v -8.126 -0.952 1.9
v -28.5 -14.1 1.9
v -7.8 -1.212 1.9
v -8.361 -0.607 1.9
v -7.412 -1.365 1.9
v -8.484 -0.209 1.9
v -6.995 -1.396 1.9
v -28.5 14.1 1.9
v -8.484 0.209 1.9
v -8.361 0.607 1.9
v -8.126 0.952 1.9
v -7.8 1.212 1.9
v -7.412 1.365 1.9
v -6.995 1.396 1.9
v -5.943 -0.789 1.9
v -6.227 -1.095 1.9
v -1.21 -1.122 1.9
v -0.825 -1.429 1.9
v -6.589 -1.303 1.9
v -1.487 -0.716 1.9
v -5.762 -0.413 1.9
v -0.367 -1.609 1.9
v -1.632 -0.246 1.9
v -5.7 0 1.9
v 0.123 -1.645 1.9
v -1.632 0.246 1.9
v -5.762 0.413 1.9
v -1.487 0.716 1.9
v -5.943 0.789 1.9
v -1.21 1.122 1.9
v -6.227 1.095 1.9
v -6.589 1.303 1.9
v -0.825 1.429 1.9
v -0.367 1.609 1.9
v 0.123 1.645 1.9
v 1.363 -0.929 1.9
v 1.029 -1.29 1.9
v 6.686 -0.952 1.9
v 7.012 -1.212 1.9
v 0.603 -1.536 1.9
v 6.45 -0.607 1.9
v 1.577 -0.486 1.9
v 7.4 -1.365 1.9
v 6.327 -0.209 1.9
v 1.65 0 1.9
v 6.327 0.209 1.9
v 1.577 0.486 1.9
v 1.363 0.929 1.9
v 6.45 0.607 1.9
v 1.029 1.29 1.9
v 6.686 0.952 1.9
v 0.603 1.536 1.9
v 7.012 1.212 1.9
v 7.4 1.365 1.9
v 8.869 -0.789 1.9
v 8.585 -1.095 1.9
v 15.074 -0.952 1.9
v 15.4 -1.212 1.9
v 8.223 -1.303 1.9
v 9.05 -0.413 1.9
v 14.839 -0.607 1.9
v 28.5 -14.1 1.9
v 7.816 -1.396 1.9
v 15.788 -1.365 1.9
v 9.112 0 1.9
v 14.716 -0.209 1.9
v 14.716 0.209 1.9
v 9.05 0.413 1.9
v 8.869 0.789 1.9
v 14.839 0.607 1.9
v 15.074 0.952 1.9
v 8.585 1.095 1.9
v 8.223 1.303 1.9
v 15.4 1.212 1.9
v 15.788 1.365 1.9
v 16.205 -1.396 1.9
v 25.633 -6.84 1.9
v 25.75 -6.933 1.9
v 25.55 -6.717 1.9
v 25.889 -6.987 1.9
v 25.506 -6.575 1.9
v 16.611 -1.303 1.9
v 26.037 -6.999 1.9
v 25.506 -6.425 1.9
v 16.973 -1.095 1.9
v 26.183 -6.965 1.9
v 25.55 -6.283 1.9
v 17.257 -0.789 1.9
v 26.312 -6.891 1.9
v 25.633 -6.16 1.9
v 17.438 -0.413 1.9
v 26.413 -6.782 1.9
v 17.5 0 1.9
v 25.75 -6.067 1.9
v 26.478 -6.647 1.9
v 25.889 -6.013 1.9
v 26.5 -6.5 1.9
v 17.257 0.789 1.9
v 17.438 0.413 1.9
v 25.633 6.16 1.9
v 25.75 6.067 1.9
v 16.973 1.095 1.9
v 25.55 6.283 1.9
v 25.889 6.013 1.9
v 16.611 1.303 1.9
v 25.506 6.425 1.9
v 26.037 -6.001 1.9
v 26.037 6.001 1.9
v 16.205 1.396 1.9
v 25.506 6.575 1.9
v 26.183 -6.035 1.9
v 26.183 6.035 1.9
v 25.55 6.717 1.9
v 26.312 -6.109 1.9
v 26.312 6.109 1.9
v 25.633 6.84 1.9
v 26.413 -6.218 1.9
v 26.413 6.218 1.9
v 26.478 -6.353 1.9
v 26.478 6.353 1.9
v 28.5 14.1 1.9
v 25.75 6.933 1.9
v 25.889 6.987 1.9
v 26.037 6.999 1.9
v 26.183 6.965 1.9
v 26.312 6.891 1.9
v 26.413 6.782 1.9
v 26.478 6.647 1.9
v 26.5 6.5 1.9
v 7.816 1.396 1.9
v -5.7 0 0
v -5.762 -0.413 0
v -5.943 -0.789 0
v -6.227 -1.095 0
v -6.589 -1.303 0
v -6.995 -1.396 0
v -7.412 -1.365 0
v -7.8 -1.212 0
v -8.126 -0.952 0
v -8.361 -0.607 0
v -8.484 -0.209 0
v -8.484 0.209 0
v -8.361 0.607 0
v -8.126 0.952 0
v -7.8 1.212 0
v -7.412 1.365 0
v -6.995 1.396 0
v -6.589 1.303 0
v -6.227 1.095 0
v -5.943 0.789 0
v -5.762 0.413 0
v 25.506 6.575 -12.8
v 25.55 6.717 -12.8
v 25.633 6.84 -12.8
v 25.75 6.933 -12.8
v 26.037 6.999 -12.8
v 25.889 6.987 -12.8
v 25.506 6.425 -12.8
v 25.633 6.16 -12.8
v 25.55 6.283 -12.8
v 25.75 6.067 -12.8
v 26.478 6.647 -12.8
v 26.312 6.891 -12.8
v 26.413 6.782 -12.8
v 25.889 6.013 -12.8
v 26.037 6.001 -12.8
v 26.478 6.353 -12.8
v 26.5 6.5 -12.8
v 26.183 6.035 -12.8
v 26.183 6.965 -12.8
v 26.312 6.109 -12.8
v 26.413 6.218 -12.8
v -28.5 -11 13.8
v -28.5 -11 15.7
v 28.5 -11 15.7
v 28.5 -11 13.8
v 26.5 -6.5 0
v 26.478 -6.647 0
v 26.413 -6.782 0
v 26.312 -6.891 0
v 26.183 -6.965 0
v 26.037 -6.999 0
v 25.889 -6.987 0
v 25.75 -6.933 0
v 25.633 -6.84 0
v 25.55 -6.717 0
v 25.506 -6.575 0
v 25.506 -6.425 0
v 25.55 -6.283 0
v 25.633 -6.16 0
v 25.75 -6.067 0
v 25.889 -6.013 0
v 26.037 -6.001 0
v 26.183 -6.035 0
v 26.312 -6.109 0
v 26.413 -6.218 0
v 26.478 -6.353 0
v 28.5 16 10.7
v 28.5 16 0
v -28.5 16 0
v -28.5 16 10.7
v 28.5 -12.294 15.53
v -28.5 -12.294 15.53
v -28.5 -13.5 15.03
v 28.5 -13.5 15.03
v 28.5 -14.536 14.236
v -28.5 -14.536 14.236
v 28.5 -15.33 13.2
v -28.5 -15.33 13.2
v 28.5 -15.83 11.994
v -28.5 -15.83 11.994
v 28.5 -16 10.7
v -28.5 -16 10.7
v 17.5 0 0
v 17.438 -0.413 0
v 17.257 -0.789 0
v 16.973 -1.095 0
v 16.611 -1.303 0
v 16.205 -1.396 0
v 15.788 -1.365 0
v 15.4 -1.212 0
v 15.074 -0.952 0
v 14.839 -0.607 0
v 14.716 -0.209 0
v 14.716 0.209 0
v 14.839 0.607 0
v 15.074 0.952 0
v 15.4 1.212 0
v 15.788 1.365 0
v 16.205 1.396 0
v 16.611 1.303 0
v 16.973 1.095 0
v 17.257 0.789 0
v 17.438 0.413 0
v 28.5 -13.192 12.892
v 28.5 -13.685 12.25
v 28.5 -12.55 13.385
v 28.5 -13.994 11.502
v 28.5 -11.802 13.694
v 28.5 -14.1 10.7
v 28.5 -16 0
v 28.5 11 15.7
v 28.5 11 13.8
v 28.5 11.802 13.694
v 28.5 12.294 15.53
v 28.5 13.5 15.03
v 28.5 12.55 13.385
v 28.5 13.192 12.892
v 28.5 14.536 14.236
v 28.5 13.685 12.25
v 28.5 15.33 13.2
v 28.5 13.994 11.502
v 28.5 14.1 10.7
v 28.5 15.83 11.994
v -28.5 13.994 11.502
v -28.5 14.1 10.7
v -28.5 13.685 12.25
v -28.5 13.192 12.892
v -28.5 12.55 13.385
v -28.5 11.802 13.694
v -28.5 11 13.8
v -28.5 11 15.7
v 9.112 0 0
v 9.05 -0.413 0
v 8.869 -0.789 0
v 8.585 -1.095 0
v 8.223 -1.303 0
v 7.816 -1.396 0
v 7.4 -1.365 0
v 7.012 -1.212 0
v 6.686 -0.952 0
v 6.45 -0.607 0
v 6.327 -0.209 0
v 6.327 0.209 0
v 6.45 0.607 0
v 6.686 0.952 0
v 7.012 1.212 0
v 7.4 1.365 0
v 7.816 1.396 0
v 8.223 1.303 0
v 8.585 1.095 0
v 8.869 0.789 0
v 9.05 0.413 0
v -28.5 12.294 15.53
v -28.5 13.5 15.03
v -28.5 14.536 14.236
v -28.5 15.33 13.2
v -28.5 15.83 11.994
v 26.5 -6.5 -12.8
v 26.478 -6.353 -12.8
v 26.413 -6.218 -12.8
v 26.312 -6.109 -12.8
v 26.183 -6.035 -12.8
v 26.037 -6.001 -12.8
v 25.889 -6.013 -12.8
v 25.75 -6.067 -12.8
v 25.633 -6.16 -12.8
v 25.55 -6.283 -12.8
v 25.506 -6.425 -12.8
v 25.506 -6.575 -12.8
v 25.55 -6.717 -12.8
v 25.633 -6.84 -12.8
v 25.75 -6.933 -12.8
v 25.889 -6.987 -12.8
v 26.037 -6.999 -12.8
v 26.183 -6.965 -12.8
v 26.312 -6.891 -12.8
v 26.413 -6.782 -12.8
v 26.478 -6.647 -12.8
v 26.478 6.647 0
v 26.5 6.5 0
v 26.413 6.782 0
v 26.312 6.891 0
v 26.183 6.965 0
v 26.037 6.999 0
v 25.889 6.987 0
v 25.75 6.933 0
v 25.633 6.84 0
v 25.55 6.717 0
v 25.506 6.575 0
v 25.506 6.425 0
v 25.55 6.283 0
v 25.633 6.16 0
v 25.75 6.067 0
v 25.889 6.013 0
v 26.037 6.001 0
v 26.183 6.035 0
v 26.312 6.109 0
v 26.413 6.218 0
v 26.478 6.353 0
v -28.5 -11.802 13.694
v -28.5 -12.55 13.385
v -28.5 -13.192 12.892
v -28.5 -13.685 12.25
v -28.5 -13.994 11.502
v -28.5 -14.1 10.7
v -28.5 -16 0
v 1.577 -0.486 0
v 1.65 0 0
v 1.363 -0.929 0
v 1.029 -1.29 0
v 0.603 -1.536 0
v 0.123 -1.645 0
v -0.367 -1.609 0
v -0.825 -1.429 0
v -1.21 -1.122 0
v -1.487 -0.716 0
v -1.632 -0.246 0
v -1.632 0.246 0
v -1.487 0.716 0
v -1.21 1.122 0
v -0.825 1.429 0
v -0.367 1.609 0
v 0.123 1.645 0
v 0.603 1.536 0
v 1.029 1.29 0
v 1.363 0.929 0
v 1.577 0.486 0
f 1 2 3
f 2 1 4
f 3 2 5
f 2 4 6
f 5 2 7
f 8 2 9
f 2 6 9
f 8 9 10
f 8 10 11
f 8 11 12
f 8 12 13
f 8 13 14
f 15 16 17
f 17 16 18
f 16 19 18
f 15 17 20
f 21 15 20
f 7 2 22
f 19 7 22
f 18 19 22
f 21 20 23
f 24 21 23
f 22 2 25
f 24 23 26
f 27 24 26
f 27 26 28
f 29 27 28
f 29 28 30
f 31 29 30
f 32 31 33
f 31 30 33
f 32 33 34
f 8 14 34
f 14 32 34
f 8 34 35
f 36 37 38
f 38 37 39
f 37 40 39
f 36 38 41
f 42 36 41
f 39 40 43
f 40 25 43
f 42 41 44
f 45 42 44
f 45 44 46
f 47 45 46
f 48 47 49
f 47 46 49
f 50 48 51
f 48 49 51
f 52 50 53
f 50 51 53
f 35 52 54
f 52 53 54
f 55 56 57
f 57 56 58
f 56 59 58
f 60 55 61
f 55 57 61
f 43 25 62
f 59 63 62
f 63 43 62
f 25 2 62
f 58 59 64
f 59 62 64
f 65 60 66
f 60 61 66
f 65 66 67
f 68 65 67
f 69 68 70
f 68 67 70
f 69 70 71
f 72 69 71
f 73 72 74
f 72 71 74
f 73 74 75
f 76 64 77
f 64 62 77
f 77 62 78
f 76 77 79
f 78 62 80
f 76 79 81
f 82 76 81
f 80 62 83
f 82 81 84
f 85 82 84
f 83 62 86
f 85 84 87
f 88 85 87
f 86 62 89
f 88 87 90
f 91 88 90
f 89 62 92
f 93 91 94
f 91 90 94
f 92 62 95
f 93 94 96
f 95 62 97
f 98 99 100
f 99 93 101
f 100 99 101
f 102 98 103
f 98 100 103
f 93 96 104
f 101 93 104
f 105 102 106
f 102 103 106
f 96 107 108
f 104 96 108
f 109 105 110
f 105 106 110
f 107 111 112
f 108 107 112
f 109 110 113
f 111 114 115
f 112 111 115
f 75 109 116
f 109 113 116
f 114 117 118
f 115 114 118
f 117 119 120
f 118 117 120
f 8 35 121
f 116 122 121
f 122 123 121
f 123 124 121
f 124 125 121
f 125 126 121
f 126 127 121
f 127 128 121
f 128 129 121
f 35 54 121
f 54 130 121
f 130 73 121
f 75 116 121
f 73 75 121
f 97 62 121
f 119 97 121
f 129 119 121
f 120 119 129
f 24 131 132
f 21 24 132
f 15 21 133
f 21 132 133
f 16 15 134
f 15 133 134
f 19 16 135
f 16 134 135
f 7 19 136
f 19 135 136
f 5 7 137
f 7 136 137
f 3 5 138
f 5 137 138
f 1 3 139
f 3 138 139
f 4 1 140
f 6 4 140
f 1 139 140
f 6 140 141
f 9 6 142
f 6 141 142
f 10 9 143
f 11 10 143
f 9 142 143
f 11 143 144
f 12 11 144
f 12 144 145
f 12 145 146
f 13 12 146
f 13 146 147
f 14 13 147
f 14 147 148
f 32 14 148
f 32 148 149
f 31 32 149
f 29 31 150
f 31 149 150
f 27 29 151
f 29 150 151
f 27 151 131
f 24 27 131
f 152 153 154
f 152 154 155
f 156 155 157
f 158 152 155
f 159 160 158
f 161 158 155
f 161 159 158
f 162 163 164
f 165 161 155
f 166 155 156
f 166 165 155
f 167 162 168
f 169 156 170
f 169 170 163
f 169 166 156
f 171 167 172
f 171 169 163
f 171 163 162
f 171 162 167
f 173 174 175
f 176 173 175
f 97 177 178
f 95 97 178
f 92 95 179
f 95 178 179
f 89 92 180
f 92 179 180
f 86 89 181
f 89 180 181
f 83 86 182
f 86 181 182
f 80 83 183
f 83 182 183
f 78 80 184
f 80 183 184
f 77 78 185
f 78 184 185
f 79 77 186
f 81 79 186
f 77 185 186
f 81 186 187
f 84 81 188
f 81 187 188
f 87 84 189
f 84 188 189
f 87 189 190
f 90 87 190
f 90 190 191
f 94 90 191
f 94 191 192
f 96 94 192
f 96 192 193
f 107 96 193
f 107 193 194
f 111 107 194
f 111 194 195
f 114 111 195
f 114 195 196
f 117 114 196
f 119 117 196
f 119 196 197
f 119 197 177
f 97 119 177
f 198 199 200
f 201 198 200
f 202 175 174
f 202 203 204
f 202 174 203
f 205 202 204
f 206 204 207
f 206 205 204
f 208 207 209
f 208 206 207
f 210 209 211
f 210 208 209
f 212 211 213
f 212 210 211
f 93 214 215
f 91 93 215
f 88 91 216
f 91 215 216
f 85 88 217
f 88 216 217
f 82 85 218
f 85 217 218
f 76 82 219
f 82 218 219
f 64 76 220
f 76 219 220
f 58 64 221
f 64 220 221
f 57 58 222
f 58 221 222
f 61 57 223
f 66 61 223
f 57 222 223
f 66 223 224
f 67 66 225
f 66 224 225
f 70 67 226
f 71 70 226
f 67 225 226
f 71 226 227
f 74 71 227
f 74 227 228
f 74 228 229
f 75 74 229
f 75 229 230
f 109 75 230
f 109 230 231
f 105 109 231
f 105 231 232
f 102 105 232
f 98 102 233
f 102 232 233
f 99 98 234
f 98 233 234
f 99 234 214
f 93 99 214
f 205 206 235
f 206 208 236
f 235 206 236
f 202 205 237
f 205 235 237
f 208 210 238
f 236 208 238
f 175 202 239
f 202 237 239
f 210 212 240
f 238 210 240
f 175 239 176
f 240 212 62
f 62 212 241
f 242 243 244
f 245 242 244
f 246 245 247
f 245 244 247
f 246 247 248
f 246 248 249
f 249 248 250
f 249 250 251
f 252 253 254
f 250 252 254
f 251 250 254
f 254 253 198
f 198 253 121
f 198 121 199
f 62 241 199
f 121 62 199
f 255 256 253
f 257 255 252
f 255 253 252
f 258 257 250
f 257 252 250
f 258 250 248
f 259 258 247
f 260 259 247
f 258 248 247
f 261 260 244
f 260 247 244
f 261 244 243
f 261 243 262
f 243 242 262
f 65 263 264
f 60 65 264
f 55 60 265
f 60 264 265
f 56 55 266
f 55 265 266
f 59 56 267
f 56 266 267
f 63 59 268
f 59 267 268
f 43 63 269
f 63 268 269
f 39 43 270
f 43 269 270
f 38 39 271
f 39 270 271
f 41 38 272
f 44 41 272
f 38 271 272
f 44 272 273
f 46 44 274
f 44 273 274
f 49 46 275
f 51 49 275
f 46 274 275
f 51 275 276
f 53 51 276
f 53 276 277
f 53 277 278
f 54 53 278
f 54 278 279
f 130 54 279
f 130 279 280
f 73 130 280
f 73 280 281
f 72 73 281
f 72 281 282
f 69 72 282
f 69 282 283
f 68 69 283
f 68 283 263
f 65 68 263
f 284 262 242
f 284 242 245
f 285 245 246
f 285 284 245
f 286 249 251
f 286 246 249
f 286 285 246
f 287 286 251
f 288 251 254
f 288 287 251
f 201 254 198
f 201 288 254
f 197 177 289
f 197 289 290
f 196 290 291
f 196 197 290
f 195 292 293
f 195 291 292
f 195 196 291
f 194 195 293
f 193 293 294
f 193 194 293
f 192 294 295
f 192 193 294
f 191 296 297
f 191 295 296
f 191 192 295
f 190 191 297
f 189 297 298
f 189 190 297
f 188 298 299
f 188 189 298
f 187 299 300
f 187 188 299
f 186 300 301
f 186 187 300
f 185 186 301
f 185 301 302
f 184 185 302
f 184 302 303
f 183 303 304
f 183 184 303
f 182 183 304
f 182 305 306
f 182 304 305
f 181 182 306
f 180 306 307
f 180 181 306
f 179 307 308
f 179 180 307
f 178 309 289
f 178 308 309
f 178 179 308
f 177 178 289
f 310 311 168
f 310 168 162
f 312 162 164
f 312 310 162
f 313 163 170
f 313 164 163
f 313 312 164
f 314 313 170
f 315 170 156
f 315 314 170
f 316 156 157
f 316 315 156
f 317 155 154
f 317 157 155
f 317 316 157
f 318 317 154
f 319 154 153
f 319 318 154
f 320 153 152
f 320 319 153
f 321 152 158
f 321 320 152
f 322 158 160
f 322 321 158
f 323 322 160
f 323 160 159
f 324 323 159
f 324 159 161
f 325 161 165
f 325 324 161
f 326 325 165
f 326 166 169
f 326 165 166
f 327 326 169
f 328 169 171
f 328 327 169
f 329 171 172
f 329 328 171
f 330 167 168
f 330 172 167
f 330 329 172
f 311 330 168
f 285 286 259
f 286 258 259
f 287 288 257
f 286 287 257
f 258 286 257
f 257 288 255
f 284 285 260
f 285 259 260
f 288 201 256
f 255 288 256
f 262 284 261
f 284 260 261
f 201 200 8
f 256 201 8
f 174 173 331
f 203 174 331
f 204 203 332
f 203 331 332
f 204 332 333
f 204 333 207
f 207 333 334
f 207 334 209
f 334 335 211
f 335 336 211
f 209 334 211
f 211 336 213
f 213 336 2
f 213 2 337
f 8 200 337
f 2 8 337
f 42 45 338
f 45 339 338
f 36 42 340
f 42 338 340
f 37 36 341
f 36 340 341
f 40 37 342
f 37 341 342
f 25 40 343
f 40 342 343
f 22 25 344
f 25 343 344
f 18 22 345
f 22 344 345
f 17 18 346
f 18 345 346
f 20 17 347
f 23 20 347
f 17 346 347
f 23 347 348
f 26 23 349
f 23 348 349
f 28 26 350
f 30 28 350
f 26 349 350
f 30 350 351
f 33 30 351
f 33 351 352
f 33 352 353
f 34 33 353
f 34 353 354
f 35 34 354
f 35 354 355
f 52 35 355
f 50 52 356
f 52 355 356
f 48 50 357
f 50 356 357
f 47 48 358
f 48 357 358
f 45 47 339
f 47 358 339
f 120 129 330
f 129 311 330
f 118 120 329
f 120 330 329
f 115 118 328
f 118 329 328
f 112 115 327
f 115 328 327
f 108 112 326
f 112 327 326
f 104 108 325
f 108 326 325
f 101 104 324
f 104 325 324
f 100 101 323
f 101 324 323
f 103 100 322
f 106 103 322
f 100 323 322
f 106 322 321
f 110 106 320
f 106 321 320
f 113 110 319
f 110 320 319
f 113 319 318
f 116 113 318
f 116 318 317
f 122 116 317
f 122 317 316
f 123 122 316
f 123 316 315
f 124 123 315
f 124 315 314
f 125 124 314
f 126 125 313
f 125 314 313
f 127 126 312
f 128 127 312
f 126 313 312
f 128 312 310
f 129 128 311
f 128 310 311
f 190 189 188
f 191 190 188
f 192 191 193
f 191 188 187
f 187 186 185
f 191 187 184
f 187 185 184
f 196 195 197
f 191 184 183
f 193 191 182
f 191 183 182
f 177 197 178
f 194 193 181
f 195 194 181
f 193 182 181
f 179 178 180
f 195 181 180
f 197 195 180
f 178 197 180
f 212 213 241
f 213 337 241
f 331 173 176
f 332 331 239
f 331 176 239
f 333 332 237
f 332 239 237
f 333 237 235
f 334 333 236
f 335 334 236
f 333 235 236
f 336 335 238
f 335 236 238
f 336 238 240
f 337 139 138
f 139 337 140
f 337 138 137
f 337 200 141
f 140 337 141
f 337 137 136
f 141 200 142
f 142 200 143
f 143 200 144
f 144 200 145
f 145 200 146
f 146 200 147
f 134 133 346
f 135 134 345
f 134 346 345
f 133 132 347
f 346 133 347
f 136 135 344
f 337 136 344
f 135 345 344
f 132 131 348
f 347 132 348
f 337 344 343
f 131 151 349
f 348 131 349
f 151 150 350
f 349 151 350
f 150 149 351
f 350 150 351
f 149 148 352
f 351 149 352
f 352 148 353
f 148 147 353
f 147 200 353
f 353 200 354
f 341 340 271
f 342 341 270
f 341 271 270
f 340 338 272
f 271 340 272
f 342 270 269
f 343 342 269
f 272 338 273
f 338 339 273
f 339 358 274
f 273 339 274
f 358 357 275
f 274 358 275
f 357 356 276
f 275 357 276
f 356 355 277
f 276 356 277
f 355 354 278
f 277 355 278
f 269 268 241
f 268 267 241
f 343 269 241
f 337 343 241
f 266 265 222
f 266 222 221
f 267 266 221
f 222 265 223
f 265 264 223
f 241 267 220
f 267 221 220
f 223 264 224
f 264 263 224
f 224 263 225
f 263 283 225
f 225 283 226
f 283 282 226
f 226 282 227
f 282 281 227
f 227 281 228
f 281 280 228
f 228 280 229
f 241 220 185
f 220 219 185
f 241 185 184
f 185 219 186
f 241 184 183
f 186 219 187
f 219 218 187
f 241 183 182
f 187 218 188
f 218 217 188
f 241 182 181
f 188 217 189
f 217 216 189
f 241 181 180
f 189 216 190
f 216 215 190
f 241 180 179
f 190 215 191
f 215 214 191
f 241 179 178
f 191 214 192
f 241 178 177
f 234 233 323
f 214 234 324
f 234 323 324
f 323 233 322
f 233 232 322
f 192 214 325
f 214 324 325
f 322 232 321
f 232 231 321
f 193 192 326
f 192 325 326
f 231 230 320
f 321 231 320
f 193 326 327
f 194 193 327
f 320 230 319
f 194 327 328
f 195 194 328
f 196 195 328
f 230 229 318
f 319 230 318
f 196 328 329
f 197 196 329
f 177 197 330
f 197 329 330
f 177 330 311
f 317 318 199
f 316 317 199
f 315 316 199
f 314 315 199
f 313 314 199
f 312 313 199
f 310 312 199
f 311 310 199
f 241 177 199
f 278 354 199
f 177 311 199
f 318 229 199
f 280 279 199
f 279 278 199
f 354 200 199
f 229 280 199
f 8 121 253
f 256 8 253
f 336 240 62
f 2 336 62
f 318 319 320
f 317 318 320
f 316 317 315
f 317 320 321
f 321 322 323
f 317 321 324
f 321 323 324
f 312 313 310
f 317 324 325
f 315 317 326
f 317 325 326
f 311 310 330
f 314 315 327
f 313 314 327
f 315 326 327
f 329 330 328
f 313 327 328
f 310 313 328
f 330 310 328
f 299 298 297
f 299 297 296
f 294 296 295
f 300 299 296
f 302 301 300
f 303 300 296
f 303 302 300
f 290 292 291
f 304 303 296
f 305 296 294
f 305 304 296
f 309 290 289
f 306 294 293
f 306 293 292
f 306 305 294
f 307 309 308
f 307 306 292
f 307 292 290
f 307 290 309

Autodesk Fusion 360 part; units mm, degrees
sketch "Sketch1" plane through (0, 0, 0) normal (0, 0, 1) x (1, 0, 0)
  line L0 (28.5, 16) -> (-28.5, 16)
  line L1 (-28.5, 16) -> (-28.5, -16)
  line L2 (-28.5, -16) -> (28.5, -16)
  line L3 (28.5, -16) -> (28.5, 16)
  line L4 (28.5, 16) -> (-28.5, -16) construction
  line L5 (-28.5, 16) -> (28.5, -16) construction
  circle A0 centre (0, 0) radius 1.65
  circle A1 centre (-7.1, 0) radius 1.4
  line L6 (-28.5, 0) -> (28.5, 0) construction
  circle A2 centre (7.7118, 0) radius 1.4
  circle A3 centre (16.1, 0) radius 1.4
  circle A4 centre (26, 6.5) radius 0.5
  circle A5 centre (26, -6.5) radius 0.5
  line L7 (26, 6.5) -> (26, -6.5) construction
  dimension "d1" = 57
  dimension "d2" = 32
  dimension "d3" = 3.3
  dimension "d4" = 2.8
  dimension "d5" = 7.1
  dimension "d6" = 2.8
  dimension "d7" = 7.7118
  dimension "d8" = 2.8
  dimension "d9" = 16.1
  dimension "d10" = 1
  dimension "d11" = 1
  dimension "d12" = 13
  dimension "d13" = 9.9
extrude "Extrude1" add sketch "Sketch1" along normal blind 15.7 makes body 1
fillet "Fillet1" radius 5 2 edges at (0, -16, 15.7) (0, 16, 15.7) on bodies 1
sketch "Sketch2" plane through (0, 0, 0) normal (0, 0, -1) x (1, 0, 0)
  circle A0 centre (-7.1, 0) radius 1.4
  circle A1 centre (26, -6.5) radius 0.5
  circle A2 centre (0, 0) radius 1.65
  circle A3 centre (7.7118, 0) radius 1.4
  circle A4 centre (26, 6.5) radius 0.5
  circle A5 centre (16.1, 0) radius 1.4
  line L0 (28.5, -16) -> (28.5, 16)
  line L1 (28.5, 16) -> (-28.5, 16)
  line L2 (-28.5, 16) -> (-28.5, -16)
  line L3 (-28.5, -16) -> (28.5, -16)
  circle A6 centre (26, 6.5) radius 0.5
  circle A7 centre (26, -6.5) radius 0.5
extrude "Extrude2" add sketch "Sketch2" along normal blind 12.8 separate body contours A1 A7 | A4 A6 makes body 2 at (26.1354, -6.9813, -8.5333) makes body 3 at (26.2713, 6.92, -8.5333)
sketch "Sketch3" plane through (28.5, 0, 0) normal (1, 0, 0) x (0, 1, 0)
  arc A0 (16, 10.7) -> (11, 15.7) centre (11, 10.7) ccw
  line L0 (11, 15.7) -> (-11, 15.7)
  arc A1 (-11, 15.7) -> (-16, 10.7) centre (-11, 10.7) ccw
  line L1 (-16, 10.7) -> (-16, 0)
  line L2 (-16, 0) -> (16, 0)
  line L3 (16, 0) -> (16, 10.7)
  line L4 (-14.1, 10.7) -> (-14.1, 1.9)
  line L5 (-14.1, 1.9) -> (14.1, 1.9)
  line L6 (14.1, 1.9) -> (14.1, 10.7)
  arc A2 (14.1, 10.7) -> (11, 13.8) centre (11, 10.7) ccw
  line L7 (11, 13.8) -> (-11, 13.8)
  arc A3 (-11, 13.8) -> (-14.1, 10.7) centre (-11, 10.7) ccw
  dimension "d19" = -1.9
extrude "Extrude3" cut sketch "Sketch3" against normal through all contours L4 L5 L6 A2 L7 A3 bodies 1
sketch "Sketch4" plane through (0, 0, 15.7) normal (0, 0, 1) x (-1, 0, 0)
  circle A0 centre (-16.1, 0) radius 1.4
  circle A1 centre (-26, 6.5) radius 0.5
  circle A2 centre (-7.7118, 0) radius 1.4
  circle A3 centre (0, 0) radius 1.65
  circle A4 centre (-26, -6.5) radius 0.5
  circle A5 centre (7.1, 0) radius 1.4
  line L0 (-28.5, -11) -> (28.5, -11)
  line L1 (28.5, -11) -> (28.5, 11)
  line L2 (28.5, 11) -> (-28.5, 11)
  line L3 (-28.5, 11) -> (-28.5, -11)
  line L4 (28.5, -11) -> (-28.5, -11)
  line L5 (-28.5, 11) -> (28.5, 11)
  line L6 (28.5, -11) -> (28.5, 11)
  line L7 (-28.5, 11) -> (-28.5, -11)
extrude "Extrude4" cut sketch "Sketch4" against normal blind 2 bodies 1
combine "Combine1" operation add target body 3 tool bodies 2 1
